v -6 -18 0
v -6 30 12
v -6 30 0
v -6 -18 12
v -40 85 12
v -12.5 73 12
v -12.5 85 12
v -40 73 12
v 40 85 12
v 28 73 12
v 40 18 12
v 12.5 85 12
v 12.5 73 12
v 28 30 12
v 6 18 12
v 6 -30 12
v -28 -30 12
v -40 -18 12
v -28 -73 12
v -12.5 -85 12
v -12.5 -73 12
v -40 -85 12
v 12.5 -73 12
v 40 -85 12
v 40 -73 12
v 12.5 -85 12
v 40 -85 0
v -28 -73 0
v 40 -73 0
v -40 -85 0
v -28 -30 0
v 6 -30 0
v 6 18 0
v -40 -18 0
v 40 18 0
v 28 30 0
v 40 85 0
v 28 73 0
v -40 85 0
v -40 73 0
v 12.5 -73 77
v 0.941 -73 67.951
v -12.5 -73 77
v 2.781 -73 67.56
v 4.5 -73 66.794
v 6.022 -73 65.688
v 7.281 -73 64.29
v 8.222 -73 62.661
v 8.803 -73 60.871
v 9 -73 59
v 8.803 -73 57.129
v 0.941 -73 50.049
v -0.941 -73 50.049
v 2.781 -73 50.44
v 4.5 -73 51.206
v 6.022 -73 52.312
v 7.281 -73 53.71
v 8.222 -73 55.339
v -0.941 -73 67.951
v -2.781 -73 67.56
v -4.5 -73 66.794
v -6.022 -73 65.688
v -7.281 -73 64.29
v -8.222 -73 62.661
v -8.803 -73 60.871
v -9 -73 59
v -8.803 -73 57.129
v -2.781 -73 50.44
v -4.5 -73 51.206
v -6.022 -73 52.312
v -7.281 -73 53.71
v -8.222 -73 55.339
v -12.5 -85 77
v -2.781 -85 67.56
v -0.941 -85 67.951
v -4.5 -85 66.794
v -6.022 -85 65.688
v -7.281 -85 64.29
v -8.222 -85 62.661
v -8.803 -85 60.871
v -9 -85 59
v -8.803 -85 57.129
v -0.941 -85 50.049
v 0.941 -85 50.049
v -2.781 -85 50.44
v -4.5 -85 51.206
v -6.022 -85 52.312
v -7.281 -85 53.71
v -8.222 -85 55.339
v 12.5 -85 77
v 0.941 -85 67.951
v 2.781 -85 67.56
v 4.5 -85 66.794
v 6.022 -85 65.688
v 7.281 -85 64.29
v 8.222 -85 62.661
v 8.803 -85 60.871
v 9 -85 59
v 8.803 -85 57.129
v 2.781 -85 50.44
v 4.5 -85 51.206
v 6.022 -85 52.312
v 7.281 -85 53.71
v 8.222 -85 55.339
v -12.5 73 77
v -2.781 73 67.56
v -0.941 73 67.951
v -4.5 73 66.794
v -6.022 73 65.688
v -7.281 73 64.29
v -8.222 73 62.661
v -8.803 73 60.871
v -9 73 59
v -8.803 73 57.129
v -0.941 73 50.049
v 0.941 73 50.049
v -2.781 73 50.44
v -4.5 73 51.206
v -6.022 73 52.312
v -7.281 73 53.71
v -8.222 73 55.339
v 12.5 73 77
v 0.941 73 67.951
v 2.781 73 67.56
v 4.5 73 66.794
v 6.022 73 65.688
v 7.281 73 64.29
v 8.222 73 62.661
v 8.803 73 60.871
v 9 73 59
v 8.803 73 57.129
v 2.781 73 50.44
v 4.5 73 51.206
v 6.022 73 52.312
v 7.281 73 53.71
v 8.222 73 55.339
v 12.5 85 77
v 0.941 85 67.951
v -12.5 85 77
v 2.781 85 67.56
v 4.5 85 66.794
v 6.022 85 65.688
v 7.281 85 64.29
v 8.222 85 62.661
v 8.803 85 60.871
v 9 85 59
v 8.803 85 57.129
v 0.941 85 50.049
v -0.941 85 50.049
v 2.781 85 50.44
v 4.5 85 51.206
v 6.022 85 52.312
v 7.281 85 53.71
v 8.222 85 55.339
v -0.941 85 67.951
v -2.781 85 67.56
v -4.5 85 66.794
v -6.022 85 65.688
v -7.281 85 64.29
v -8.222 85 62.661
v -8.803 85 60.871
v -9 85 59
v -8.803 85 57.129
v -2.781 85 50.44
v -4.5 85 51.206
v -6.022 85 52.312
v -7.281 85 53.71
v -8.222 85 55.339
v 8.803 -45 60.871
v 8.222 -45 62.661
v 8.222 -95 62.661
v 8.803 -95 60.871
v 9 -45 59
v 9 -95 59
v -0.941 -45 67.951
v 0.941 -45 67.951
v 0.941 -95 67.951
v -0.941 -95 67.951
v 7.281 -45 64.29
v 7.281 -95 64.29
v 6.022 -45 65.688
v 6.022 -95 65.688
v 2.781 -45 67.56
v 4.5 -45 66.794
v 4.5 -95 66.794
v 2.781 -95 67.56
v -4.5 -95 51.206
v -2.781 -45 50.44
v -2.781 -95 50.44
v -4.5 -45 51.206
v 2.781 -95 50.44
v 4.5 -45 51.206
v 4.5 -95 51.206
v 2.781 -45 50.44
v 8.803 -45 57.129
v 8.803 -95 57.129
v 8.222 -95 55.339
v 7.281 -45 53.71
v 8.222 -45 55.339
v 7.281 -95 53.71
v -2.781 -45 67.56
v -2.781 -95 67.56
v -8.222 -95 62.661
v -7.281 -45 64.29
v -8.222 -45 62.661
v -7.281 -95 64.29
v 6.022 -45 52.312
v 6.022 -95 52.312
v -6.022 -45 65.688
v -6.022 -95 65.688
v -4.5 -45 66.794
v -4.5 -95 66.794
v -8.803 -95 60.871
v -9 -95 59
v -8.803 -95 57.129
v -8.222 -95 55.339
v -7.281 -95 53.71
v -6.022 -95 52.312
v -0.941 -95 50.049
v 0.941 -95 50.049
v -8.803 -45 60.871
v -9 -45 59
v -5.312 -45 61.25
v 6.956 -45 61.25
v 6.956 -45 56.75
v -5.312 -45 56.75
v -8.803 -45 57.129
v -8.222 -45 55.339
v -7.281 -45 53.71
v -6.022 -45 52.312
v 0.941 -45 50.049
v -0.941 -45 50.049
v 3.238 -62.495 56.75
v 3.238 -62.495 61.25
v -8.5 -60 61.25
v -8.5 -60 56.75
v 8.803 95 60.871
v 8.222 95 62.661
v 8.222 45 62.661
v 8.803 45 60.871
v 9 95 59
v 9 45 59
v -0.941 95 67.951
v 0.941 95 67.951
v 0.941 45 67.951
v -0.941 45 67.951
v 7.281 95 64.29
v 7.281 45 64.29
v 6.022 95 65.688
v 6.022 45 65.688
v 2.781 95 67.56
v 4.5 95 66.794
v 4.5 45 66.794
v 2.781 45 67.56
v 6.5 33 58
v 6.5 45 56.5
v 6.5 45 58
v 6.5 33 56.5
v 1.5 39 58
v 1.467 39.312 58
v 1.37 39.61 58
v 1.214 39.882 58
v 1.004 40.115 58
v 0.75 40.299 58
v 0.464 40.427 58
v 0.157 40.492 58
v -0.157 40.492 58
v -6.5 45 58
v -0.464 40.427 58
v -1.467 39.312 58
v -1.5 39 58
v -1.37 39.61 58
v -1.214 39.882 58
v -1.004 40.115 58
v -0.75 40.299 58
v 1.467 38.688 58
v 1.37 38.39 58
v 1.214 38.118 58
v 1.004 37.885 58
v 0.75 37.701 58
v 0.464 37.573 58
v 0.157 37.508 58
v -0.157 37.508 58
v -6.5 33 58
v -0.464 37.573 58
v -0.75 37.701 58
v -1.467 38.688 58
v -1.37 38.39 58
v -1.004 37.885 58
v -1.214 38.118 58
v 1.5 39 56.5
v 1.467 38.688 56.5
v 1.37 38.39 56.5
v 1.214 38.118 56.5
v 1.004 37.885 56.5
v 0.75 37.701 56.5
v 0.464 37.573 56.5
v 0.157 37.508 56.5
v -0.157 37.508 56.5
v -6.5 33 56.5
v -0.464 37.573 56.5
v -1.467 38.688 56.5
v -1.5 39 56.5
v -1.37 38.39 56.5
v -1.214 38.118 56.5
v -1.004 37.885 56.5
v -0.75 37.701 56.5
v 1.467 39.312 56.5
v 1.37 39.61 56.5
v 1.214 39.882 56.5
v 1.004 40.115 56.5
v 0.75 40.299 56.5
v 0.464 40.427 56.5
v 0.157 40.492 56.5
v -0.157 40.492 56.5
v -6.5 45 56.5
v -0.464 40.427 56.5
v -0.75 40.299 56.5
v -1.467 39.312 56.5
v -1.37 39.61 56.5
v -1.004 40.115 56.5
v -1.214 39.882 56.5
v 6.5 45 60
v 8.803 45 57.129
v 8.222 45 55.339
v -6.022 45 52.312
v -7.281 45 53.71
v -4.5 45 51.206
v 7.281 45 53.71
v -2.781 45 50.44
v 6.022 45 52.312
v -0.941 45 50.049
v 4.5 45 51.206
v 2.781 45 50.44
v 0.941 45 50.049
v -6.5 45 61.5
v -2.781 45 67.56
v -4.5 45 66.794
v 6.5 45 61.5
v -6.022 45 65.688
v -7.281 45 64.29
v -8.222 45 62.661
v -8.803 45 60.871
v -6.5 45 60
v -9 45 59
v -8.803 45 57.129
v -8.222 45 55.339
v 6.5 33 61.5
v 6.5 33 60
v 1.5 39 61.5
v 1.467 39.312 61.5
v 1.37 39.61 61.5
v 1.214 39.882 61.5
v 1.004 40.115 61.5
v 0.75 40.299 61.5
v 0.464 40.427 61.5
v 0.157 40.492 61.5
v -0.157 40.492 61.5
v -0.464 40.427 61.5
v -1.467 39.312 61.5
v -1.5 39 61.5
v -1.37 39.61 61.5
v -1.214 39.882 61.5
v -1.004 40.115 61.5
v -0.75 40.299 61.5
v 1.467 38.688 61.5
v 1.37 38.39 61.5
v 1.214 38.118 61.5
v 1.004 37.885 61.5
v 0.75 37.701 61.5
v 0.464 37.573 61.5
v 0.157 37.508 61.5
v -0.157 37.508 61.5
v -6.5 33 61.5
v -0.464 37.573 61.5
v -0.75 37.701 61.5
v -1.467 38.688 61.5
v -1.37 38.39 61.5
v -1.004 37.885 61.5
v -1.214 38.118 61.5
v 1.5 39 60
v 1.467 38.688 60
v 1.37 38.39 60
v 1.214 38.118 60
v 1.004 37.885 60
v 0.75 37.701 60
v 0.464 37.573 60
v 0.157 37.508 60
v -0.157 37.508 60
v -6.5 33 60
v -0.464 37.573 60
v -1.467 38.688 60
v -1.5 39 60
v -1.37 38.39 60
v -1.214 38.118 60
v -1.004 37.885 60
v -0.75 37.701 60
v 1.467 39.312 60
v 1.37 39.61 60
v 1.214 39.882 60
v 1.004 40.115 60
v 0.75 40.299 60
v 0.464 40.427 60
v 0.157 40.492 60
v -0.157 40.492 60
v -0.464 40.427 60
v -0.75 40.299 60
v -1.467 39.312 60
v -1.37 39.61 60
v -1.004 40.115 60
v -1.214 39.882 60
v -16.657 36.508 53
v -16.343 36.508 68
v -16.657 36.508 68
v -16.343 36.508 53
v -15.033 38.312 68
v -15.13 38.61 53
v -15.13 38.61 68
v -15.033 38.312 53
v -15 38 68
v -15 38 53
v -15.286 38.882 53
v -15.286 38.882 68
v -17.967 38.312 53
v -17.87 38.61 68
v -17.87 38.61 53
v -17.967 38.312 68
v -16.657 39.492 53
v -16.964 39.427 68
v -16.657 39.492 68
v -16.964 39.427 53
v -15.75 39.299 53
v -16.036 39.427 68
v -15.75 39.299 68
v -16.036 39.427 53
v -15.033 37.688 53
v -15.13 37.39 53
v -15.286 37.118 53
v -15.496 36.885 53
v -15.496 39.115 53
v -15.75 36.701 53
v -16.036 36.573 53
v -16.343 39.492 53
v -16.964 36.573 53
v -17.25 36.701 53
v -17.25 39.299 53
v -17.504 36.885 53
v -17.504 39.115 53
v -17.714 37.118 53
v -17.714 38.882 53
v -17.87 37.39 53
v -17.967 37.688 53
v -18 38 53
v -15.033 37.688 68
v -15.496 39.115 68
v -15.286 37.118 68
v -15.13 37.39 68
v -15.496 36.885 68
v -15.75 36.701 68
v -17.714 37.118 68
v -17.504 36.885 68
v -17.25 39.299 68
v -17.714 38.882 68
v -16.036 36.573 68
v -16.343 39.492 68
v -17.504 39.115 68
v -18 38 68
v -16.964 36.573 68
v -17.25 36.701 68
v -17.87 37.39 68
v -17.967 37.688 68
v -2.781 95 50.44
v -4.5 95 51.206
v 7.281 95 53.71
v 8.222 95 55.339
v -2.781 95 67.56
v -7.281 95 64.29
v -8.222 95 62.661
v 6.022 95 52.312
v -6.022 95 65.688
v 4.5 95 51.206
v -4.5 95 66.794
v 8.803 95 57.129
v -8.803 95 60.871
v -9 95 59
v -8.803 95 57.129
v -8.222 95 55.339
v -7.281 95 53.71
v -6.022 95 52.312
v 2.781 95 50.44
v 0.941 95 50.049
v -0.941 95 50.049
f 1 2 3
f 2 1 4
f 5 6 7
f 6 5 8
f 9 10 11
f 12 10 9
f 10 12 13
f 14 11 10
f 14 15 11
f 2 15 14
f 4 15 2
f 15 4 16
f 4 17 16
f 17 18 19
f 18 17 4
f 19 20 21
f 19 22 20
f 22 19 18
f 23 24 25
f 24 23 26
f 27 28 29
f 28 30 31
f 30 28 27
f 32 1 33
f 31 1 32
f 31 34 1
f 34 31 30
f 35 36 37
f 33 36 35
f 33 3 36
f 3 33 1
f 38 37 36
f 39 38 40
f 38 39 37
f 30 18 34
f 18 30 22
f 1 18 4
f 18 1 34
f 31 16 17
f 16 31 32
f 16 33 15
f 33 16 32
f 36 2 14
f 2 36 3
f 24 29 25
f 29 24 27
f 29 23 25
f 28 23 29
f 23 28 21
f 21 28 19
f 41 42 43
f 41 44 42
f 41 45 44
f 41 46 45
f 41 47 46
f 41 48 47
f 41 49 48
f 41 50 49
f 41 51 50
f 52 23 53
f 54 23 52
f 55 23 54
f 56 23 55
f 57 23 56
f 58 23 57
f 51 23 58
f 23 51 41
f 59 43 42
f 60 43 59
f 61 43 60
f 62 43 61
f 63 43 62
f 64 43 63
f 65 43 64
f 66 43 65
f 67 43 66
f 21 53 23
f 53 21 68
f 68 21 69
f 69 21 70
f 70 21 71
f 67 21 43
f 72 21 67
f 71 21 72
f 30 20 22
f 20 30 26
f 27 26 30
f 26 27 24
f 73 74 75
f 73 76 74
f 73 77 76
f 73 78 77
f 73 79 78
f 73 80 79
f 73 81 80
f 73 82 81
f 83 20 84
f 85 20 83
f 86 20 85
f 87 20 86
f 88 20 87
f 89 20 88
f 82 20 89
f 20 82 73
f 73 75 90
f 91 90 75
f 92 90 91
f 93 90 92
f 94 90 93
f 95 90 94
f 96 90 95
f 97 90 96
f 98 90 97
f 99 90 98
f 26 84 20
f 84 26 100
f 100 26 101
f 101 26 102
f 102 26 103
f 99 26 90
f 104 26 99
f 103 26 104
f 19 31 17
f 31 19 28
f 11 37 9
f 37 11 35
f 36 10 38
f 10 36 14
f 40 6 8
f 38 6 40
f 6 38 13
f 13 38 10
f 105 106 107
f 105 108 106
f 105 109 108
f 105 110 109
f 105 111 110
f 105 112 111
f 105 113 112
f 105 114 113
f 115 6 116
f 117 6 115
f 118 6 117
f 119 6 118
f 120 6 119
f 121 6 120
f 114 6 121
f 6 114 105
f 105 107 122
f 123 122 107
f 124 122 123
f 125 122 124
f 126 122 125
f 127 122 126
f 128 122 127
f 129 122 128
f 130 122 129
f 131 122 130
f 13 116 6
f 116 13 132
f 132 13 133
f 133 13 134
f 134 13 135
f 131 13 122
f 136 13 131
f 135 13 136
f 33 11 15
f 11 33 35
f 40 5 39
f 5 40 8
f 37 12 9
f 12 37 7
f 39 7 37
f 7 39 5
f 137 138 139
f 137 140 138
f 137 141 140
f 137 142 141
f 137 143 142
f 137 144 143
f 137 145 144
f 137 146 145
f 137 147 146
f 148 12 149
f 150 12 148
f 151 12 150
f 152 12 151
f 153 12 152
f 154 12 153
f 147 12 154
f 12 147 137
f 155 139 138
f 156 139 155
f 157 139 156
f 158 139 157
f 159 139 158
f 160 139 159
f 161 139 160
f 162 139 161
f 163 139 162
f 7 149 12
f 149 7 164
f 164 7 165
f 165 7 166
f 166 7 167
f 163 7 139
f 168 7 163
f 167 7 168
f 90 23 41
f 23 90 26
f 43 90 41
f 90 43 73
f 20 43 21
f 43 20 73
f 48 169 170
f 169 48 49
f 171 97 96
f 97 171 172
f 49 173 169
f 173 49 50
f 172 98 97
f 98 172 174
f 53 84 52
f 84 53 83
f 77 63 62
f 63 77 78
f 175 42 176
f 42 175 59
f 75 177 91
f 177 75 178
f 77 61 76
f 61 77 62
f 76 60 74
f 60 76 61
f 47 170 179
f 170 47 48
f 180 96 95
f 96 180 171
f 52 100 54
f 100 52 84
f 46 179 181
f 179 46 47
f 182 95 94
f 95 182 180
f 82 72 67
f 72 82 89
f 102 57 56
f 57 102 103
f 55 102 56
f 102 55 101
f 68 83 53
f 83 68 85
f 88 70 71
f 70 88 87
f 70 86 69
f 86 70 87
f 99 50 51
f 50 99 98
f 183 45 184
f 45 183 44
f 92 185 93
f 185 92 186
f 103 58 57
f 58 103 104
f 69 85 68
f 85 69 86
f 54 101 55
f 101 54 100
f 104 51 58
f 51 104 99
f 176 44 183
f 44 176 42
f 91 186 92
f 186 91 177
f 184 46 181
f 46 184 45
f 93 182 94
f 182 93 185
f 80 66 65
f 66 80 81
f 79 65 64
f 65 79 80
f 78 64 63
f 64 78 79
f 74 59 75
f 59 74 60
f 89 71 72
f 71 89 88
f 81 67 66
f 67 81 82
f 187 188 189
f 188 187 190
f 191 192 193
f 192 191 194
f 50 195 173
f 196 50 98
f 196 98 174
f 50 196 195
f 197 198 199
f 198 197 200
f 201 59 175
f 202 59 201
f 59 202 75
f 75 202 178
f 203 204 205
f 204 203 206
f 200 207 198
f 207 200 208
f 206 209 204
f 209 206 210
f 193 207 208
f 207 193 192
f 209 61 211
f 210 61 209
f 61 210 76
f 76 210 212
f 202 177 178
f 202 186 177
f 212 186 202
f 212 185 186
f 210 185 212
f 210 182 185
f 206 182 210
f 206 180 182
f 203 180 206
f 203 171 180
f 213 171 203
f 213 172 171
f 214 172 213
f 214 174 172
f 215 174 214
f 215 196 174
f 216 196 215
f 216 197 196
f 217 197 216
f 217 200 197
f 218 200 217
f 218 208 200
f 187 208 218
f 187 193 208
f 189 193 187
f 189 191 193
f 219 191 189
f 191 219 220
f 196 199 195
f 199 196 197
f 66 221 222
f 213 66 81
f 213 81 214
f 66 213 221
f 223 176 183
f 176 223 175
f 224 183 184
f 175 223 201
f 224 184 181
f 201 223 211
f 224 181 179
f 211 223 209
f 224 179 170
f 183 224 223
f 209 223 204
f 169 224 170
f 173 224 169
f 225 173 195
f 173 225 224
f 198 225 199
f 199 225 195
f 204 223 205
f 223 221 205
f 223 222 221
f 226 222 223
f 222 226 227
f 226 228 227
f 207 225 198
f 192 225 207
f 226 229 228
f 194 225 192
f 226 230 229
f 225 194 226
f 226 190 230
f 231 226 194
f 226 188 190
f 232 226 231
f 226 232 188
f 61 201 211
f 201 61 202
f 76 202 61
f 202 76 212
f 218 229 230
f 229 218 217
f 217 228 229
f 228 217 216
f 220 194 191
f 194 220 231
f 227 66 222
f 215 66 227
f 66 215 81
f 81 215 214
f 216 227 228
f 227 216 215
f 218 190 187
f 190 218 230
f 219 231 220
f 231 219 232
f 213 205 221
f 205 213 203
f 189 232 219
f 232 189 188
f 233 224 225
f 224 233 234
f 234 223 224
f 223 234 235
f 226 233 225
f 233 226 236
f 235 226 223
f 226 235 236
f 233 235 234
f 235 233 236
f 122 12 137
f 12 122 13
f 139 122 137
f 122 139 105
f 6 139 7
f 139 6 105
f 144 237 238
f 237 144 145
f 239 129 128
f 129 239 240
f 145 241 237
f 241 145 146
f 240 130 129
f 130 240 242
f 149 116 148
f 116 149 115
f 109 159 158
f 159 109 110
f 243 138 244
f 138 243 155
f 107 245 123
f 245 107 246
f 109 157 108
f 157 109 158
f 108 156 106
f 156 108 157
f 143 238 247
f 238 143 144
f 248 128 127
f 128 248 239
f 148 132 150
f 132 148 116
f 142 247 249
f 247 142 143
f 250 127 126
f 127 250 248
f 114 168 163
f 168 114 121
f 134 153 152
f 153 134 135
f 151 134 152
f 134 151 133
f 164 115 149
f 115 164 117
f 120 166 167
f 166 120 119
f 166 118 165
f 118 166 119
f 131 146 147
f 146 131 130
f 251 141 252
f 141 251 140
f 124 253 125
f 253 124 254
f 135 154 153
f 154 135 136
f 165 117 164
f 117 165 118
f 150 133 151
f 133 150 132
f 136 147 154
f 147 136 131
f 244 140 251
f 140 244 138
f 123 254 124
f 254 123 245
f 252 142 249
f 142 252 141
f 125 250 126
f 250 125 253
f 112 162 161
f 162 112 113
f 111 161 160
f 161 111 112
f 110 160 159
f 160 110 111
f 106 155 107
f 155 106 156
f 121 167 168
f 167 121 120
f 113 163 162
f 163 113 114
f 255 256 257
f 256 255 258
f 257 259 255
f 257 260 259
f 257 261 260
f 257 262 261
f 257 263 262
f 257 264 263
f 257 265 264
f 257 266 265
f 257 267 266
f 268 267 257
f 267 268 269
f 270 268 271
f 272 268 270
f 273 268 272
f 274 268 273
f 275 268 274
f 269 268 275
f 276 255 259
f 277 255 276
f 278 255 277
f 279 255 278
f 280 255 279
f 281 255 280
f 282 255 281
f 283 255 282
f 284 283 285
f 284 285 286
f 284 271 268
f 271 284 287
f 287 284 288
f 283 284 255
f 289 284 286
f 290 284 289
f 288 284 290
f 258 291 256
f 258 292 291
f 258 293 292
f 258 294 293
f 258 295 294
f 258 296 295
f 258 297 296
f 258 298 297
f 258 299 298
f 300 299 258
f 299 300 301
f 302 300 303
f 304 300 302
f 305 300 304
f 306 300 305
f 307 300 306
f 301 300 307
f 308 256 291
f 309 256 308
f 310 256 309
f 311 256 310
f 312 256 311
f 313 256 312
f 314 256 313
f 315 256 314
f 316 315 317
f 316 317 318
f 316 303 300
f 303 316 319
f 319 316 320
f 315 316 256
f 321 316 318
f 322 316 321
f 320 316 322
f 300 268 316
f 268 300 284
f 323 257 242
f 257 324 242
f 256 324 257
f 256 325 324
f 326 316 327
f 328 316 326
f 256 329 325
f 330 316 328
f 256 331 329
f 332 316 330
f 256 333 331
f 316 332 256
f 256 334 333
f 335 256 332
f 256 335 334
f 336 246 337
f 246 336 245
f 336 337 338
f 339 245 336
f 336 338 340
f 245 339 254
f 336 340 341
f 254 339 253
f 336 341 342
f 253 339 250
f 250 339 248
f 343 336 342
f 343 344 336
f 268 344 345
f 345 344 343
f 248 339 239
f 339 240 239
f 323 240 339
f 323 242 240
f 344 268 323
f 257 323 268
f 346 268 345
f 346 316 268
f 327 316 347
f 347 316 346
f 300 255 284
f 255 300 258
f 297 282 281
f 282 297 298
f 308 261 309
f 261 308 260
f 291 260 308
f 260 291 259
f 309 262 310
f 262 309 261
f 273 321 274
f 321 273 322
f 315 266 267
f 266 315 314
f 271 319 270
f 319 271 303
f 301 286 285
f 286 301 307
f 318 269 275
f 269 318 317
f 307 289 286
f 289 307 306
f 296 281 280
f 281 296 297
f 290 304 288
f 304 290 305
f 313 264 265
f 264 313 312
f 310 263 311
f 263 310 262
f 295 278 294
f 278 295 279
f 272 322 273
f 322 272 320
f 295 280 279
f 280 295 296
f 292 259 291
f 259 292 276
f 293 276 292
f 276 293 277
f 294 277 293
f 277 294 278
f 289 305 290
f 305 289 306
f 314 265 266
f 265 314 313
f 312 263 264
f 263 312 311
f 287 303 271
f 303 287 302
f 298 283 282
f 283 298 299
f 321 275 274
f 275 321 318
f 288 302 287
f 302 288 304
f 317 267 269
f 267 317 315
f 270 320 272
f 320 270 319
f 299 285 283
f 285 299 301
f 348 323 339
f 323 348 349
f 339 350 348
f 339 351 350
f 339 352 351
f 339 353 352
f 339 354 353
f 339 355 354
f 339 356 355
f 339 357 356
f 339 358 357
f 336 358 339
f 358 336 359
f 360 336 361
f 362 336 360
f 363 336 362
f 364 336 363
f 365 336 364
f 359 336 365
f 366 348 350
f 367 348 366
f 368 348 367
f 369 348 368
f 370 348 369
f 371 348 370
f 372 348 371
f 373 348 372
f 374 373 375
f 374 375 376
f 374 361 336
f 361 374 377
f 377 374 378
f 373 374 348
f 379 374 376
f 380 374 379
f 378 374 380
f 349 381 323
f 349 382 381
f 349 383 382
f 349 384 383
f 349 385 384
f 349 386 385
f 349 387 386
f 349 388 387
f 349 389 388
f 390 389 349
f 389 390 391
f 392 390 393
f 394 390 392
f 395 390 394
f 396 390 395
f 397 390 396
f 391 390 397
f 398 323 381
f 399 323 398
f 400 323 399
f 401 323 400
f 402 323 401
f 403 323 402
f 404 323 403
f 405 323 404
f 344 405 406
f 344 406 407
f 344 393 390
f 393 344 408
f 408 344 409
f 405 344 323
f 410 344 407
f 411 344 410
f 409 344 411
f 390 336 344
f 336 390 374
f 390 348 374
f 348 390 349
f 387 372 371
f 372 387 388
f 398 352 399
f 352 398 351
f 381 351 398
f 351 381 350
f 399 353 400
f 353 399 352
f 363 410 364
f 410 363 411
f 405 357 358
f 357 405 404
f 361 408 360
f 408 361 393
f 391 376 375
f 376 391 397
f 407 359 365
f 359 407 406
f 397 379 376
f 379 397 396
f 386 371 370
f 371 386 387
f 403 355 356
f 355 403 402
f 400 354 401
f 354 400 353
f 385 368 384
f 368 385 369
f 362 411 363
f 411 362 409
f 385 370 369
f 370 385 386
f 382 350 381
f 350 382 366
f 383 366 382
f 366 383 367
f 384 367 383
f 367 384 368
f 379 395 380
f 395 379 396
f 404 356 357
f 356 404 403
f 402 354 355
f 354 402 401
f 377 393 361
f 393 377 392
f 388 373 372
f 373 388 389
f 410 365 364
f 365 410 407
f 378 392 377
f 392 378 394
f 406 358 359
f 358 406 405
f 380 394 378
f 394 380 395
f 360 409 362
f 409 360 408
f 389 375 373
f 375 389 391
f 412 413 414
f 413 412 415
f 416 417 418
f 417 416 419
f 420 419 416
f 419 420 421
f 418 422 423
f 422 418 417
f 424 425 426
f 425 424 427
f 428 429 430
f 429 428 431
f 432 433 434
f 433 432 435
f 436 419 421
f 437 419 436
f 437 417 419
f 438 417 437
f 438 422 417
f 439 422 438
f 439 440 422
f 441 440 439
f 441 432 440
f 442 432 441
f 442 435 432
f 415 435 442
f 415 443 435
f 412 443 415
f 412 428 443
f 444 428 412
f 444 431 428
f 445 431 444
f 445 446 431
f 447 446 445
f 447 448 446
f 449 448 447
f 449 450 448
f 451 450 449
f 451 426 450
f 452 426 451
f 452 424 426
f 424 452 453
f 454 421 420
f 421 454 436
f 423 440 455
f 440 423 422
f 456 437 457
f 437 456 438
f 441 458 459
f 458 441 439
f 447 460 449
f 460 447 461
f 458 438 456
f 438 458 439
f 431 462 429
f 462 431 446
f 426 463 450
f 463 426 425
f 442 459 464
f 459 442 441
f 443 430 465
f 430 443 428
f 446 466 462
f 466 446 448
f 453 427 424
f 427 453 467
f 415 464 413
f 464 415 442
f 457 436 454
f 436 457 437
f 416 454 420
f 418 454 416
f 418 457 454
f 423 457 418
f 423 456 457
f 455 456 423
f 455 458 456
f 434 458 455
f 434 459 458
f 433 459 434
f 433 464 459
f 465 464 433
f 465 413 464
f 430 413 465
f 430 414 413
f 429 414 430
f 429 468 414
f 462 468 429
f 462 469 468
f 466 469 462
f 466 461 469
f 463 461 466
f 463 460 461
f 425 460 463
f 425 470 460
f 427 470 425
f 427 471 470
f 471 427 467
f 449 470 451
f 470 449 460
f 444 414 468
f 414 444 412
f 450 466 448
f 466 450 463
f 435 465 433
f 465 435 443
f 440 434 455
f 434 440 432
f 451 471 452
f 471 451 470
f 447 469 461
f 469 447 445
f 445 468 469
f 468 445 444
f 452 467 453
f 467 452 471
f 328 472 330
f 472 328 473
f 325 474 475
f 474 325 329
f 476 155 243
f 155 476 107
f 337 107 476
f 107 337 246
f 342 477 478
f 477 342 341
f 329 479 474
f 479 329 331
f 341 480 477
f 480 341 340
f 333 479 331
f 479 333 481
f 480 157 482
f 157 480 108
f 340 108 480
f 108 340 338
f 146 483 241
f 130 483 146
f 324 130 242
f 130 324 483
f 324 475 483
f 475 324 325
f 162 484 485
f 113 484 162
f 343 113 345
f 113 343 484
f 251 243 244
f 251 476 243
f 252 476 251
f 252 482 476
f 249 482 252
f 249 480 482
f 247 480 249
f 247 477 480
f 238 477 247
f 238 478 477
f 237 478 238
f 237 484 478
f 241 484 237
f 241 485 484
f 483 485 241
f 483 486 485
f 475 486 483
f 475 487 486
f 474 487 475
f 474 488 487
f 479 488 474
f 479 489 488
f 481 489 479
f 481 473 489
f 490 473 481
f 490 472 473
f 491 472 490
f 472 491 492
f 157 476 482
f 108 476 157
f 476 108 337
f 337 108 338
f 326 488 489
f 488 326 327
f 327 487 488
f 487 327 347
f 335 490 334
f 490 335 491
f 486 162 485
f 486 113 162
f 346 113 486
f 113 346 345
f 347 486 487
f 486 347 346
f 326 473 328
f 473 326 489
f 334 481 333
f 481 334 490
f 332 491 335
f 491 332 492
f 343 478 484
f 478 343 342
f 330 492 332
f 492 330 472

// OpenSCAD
// Martí Serra 2015
// This a 3D model of a Engduino rotating stand

RESOLUTION  = 30;

BASE_WIDTH  = 80;
BASE_LENGTH = 170;
BASE_HEIGHT = 12;
LEGS_LENGTH = 55;
COLU_HEIGHT = 65;
COLU_LENGTH = 25;
BAR_RADIUS  = 9;
BAR_LENGTH  = 50;
USB         = [12,15,4.5];
PLAIN       = [13,12,1.5]; 

module base(length = BASE_LENGTH, width = BASE_WIDTH, height = BASE_HEIGHT, legs = LEGS_LENGTH) {
    
    // Base left side
    translate([-width/2, -length/2, 0]) {
        cube([width, height, height]);
        cube([height,legs,height]);
        translate([0,legs,0]) {
            cube([width/2-height/2, height, height]);
            translate([width/2-height/2, 0, 0])
                cube([height, length-2*legs, height]);
        }
    }
    
    // Base right side
    translate([-width/2, length/2-height, 0]) {
        cube([width, height, height]);
        translate([width-height,-legs,0]) {
            cube([height,legs,height]);
            translate([-width/2+height/2,0,0])
                cube([width/2, height, height]);
        }
    }
}

module columns(height = COLU_HEIGHT, length = COLU_LENGTH, width = BASE_HEIGHT, radius = BAR_RADIUS, base = BASE_LENGTH) {
    
    // Left column
    translate([-length/2, -base/2, width]) {
        difference() {
            cube([length,width,height]);
            bar(width+10, radius, length/2,width+5,height-radius*2);
        }
        
        // USB bar
        translate([length/2,height-25,height-radius*2]) {
            difference() {
                bar(BAR_LENGTH, radius, 0, 0,0);
                translate([-USB[0]/2-2.5,-USB[1],-USB[2]/2])
                    rotate([0,0,-12])
                    cube([USB[0], USB[1] +4, USB[2]]);
            }
        }
    }
    
    // Right column
    translate([-length/2, base/2-width, width]) {
        difference() {
            cube([length,width,height]);
            bar(width+10, radius, length/2,width+5,height-radius*2);
        }
        
        // Plains bar
        translate([length/2,width+10,height-radius*2]) {
            bar(BAR_LENGTH, radius, 0,0,0);
            // Lower pain
            translate([-PLAIN[0]/2,-BAR_LENGTH-PLAIN[1],-1-PLAIN[2]]) {
                difference() {
                    cube([PLAIN[0],PLAIN[1],PLAIN[2]]);
                    translate([PLAIN[0]/2, PLAIN[1]/2, -3])
                        cylinder(h = 10, r = 1.5, $fn=RESOLUTION);
                }
            }
            // Upper plain
            translate([-PLAIN[0]/2,-BAR_LENGTH-PLAIN[1],+1]) {
                difference(){
                    cube([PLAIN[0],PLAIN[1],PLAIN[2]]);
                    translate([PLAIN[0]/2, PLAIN[1]/2, -3])
                    cylinder(h = 20, r = 1.5, $fn=RESOLUTION);
               }
               // Cylinder block
               translate([-10,5,-7])
               cylinder(h = 15, r = 1.5, $fn=RESOLUTION);
           }
           
        }
    }
}

module bar(length, radius, x, y, z) {
    translate([x,y,z]) 
        rotate([90,0,0])
            cylinder(h = length, r = radius, $fn=RESOLUTION);   
}

base();
columns();
